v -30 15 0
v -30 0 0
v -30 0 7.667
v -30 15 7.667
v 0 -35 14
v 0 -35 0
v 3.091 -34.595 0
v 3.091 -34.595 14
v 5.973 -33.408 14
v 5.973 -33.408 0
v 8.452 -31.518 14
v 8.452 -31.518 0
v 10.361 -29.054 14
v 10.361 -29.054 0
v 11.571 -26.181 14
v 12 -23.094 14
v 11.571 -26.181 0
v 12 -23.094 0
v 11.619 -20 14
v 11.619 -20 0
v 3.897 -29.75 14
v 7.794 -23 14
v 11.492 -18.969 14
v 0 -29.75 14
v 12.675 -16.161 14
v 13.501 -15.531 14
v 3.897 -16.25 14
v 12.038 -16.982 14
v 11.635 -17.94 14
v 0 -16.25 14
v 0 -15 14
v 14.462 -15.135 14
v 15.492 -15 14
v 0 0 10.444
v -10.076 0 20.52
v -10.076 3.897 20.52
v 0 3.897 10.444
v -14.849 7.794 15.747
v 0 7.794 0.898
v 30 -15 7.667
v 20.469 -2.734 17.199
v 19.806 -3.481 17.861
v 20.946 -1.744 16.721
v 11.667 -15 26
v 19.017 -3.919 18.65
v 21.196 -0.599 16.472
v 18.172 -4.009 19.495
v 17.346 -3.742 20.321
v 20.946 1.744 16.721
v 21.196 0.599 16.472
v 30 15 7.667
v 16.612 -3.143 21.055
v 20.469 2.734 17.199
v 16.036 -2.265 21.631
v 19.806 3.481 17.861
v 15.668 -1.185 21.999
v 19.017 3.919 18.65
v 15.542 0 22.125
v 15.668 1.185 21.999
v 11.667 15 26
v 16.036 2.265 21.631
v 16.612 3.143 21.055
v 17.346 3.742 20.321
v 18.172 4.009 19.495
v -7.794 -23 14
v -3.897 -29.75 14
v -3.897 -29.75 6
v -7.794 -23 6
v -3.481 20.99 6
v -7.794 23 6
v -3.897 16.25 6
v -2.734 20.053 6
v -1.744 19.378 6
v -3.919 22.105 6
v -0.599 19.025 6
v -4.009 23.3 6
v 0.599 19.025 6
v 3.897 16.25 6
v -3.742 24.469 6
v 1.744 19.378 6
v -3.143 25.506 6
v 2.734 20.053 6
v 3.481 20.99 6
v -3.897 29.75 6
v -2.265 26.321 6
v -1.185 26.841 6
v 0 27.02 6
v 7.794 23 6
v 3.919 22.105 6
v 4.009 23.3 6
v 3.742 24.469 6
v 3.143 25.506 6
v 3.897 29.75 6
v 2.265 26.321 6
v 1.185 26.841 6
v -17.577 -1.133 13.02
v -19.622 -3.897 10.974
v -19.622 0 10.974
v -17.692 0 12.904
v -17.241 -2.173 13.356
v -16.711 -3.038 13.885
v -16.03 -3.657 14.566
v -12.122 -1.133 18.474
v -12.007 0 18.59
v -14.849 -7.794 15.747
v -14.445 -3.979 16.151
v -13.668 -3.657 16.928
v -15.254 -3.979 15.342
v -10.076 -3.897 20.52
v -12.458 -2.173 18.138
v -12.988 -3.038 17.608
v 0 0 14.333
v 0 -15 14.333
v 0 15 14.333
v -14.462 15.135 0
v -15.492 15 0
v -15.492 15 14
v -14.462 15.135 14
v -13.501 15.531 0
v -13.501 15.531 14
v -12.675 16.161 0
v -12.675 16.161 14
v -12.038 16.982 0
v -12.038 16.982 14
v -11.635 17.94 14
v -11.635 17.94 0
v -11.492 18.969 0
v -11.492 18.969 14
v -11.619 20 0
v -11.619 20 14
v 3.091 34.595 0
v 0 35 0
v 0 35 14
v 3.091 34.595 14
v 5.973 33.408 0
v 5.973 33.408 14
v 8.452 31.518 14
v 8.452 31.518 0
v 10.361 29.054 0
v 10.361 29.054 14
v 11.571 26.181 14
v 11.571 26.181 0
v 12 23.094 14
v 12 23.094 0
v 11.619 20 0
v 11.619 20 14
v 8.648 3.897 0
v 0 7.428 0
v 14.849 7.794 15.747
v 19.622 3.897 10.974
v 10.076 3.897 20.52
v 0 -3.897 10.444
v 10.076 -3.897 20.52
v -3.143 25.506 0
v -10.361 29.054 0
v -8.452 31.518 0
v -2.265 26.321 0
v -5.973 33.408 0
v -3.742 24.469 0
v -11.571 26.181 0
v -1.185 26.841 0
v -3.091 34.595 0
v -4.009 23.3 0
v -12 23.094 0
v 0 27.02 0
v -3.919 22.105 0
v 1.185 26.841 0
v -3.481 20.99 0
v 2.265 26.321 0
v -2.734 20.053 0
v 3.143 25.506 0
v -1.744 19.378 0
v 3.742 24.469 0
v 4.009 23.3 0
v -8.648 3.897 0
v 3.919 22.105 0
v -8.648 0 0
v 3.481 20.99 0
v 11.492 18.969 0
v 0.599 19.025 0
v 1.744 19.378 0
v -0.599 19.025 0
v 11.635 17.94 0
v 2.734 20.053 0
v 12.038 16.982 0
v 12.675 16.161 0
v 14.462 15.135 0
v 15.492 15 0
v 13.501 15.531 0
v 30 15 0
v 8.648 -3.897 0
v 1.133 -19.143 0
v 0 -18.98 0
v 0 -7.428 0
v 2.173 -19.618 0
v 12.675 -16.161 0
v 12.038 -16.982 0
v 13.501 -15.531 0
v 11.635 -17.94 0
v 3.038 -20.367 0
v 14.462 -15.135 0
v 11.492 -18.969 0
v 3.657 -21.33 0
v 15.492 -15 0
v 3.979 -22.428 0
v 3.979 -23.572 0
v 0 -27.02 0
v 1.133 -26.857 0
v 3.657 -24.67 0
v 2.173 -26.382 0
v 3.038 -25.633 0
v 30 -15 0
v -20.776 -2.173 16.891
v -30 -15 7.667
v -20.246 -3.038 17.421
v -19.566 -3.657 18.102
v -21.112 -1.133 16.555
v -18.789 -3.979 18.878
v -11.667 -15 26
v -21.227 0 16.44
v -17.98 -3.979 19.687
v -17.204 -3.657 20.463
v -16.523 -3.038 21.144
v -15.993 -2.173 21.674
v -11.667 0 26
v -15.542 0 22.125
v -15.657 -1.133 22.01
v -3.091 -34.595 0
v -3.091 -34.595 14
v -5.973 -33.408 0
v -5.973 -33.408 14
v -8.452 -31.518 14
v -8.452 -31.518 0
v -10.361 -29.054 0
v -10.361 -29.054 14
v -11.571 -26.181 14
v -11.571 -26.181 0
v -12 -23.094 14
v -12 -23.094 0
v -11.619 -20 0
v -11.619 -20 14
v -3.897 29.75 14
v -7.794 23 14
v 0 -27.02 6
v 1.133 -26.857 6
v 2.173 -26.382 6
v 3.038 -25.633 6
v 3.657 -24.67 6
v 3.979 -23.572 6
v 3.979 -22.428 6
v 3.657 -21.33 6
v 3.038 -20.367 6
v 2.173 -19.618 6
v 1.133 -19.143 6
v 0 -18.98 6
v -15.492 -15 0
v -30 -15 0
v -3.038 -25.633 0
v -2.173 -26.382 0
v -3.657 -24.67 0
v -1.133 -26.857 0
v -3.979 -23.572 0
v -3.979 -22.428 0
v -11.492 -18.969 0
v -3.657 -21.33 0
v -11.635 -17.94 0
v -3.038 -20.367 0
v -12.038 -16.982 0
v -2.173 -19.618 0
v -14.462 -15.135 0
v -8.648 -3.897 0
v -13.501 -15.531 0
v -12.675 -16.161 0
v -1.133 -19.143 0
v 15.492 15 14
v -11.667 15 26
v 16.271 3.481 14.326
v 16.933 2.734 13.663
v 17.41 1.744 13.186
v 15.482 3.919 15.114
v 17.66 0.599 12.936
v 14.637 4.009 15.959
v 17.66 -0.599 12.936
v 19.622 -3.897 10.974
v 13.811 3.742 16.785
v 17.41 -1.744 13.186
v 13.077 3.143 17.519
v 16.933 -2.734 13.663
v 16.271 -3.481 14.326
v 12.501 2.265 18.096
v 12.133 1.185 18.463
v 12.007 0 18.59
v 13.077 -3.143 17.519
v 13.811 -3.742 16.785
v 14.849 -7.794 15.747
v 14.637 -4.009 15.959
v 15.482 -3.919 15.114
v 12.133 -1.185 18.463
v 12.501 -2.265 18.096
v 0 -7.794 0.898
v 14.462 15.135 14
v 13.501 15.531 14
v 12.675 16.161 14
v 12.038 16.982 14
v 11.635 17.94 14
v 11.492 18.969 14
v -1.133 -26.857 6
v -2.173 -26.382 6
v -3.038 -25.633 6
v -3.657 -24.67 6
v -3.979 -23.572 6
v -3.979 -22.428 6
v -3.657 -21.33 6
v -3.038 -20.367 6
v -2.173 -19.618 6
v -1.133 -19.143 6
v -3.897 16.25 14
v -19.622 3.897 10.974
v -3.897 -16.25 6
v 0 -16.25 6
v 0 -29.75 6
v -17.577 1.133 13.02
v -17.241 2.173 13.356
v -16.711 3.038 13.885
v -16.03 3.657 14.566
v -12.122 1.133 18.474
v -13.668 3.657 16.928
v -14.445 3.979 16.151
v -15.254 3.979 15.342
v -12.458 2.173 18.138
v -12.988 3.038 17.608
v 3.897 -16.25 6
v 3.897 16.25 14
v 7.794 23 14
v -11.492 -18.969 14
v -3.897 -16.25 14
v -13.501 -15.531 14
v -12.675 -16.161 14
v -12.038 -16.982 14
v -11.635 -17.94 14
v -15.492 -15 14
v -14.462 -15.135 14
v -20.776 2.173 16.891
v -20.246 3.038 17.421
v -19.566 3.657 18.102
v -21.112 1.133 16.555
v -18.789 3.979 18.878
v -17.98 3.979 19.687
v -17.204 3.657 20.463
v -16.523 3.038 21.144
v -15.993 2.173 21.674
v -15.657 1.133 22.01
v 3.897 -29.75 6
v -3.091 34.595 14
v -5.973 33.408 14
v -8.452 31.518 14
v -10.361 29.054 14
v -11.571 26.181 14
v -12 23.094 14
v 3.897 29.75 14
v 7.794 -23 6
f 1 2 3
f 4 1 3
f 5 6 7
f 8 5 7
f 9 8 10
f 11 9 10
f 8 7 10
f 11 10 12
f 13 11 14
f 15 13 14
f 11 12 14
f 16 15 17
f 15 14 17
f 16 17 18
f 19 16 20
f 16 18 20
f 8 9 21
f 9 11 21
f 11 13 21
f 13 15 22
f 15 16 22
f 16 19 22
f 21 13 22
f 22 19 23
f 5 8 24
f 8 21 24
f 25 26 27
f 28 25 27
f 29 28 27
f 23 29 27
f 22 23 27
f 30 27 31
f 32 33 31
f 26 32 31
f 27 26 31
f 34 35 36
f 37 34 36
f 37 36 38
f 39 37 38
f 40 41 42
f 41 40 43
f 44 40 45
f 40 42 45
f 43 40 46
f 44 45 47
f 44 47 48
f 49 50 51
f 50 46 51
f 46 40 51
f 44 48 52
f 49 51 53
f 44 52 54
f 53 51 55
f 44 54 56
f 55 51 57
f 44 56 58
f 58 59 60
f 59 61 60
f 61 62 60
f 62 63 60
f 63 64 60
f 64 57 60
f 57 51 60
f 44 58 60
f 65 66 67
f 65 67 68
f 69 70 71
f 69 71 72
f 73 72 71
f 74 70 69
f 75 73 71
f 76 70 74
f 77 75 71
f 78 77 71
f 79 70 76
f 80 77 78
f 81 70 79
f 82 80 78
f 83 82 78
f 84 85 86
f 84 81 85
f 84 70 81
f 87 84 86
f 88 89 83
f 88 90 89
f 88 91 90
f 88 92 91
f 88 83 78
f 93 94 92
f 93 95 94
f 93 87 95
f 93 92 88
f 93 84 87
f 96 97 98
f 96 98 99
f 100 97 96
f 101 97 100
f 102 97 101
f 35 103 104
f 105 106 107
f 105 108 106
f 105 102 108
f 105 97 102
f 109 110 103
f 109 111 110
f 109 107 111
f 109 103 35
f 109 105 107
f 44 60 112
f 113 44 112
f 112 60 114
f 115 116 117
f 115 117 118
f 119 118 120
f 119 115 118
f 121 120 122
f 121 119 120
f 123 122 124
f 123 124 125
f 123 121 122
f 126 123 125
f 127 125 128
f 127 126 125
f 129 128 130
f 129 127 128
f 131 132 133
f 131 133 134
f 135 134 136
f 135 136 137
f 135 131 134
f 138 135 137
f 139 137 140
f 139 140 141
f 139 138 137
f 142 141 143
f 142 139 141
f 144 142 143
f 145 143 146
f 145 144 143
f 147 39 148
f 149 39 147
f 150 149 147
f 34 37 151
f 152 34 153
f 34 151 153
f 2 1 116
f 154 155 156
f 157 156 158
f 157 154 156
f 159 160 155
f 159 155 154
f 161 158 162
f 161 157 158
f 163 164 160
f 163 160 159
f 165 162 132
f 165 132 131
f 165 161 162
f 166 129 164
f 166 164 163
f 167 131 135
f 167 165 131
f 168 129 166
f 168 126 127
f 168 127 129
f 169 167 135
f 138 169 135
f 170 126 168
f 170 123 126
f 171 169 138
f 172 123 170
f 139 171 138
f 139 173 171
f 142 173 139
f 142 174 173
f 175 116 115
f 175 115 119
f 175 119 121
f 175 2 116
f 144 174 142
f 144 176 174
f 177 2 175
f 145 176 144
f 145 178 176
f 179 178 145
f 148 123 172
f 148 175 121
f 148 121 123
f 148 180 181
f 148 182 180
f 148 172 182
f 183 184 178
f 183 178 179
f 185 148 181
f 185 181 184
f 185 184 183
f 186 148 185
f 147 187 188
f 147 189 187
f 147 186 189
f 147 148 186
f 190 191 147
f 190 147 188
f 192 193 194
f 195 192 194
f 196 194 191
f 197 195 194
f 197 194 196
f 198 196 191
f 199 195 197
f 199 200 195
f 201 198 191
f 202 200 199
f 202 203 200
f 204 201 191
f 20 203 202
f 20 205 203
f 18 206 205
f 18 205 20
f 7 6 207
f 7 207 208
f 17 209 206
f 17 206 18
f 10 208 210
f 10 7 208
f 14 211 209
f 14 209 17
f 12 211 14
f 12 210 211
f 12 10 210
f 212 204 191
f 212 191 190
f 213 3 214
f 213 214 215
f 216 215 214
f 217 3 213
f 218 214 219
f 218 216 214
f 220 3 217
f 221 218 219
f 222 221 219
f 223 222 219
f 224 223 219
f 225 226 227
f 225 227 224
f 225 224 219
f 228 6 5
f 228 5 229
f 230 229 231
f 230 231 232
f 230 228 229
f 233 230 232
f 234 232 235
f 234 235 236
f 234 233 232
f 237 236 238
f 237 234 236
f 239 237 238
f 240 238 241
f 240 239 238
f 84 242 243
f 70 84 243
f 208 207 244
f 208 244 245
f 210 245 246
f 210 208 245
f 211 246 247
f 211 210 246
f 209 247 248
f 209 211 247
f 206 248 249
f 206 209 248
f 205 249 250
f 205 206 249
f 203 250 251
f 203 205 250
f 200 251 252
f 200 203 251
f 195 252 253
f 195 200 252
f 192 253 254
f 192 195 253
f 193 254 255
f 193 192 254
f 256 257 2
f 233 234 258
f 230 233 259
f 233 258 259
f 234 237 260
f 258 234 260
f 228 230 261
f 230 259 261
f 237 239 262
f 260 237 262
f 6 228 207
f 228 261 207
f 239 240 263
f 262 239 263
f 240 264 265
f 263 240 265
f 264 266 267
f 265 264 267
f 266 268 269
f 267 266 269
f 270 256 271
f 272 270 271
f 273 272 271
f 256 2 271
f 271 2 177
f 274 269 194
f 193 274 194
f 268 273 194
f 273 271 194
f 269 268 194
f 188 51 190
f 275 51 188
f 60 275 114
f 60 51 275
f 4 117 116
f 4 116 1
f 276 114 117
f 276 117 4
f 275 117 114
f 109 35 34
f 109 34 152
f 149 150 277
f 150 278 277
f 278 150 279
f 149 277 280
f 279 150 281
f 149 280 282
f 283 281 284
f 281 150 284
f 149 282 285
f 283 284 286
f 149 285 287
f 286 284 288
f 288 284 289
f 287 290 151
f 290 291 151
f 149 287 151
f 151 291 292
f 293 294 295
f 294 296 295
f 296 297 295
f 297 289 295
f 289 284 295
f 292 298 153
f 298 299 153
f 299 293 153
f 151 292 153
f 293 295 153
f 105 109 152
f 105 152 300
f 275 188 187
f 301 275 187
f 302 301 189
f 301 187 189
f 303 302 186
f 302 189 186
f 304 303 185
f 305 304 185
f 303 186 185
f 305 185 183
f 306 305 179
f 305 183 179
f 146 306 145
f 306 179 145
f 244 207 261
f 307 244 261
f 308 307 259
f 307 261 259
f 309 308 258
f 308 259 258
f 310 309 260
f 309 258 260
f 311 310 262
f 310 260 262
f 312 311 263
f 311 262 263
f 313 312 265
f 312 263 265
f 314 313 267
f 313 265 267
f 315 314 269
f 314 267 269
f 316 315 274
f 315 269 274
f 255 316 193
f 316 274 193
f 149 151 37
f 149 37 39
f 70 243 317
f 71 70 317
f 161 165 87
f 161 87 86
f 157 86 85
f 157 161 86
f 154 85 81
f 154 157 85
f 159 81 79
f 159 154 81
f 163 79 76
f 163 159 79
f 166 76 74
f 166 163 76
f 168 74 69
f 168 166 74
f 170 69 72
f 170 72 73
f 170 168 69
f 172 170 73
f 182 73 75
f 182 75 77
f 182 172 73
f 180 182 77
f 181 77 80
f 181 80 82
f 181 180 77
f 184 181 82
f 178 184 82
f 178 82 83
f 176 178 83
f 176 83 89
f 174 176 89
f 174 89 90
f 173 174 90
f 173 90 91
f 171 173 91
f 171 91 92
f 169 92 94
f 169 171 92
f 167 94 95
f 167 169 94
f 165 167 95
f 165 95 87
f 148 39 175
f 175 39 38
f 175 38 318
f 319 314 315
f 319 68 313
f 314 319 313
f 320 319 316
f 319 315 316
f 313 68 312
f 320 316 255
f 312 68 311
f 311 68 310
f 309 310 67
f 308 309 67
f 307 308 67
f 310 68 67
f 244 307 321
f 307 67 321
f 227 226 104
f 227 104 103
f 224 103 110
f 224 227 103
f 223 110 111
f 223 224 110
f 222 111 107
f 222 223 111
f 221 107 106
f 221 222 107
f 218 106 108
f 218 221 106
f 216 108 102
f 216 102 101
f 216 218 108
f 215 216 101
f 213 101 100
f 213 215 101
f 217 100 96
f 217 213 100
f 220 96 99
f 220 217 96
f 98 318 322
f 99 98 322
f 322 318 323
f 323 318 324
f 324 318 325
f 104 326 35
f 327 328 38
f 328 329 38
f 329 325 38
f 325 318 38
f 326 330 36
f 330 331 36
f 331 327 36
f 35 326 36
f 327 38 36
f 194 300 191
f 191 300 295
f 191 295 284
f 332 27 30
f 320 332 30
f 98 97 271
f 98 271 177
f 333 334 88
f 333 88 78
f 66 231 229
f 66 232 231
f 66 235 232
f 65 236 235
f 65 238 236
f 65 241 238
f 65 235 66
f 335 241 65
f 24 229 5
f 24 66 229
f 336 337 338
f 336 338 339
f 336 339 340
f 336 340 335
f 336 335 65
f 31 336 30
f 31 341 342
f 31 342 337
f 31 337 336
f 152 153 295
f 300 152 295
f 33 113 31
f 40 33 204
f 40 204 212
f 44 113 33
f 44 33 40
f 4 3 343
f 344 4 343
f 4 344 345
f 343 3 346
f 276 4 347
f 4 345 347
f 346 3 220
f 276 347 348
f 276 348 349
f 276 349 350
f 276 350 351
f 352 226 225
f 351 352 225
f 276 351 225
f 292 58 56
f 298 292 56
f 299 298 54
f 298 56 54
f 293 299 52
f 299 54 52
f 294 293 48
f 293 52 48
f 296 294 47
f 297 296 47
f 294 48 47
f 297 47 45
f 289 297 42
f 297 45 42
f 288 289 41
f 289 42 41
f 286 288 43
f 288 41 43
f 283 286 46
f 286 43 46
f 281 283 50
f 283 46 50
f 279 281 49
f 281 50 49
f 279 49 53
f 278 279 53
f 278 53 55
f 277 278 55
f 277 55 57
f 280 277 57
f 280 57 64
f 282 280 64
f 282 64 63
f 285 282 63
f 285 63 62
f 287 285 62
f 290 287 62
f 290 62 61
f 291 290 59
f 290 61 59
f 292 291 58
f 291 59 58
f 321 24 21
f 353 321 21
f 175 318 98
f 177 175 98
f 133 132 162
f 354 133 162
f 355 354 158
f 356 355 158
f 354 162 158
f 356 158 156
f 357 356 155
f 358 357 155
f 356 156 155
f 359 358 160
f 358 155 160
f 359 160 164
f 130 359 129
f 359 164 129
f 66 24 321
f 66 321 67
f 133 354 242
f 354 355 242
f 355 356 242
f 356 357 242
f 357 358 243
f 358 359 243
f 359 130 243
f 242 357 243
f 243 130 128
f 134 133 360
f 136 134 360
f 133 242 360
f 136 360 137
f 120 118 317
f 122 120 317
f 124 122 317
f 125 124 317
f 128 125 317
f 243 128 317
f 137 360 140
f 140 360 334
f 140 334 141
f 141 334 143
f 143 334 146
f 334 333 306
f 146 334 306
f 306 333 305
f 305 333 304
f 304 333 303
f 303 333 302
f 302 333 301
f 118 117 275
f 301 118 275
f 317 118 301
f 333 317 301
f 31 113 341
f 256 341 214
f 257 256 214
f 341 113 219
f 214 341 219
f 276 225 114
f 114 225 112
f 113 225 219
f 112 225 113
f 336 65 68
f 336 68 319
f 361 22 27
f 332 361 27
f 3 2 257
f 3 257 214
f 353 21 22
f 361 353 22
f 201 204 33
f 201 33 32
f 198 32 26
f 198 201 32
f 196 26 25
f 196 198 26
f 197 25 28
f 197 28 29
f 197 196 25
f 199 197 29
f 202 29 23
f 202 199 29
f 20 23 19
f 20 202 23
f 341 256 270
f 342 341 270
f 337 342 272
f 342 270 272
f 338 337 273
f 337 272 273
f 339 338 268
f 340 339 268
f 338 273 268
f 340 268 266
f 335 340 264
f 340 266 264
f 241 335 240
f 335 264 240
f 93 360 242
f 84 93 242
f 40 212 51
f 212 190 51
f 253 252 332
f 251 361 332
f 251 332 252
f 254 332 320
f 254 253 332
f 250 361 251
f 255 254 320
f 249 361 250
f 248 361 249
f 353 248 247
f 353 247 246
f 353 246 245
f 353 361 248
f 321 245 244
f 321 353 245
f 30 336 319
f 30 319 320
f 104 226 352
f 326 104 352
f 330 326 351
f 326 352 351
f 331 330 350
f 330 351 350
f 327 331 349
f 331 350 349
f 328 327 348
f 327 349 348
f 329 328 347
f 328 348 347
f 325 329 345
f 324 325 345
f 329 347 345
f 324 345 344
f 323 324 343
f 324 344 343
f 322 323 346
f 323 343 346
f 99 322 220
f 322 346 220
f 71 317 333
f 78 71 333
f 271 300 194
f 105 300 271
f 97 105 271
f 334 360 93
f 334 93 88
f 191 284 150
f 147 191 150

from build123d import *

# Parameters (mm, degrees)
PAD_DEPTH       = 15
PAD001_DEPTH    = 14
SKETCH002_R     = 4.02
HOLE_DEPTH      = 26.635776
POCKET_DEPTH    = 21.635776
POCKET001_DEPTH = 8


with BuildPart() as body:
    # Sketch → Pad (new body)
    with BuildSketch(Plane.XZ):
        Polygon((30, 7.667262), (11.667262, 26), (0, 14.332738), (0, 0), (30, 0), align=None)
    extrude(amount=PAD_DEPTH)

    # Sketch001 → Pad001 (join)
    with BuildSketch(Plane.XY):
        with BuildLine():
            ThreePointArc((0, -27.02), (4.02, -23), (0, -18.98))
            Line((0, -18.98), (0, -15))
            Line((0, -15), (15.491933, -15))
            ThreePointArc((15.491933, -15), (12.329656, -16.55051), (11.61895, -20))
            ThreePointArc((0, -35), (9.486833, -30.348469), (11.61895, -20))
            Line((0, -35), (0, -27.02))
        make_face()
    extrude(amount=PAD001_DEPTH)

    # Sketch002 (on DatumPlane) → Hole (cut, through all)
    with BuildSketch(Plane(origin=(18.833631, 0, 18.833631), x_dir=(-0.707107, 0, 0.707107), z_dir=(0.707107, 0, 0.707107))):
        with Locations((0.634776, 0)):
            Circle(SKETCH002_R)
    extrude(amount=-HOLE_DEPTH, mode=Mode.SUBTRACT)

    # Sketch003 (on DatumPlane) → Pocket (cut, through all)
    with BuildSketch(Plane(origin=(15.298097, 0, 15.298097), x_dir=(-0.707107, 0, 0.707107), z_dir=(0.707107, 0, 0.707107))):
        Polygon((7.384776, 3.897114), (0.634776, 7.794229), (-6.115224, 3.897114), (-6.115224, -3.897114), (0.634776, -7.794229), (7.384776, -3.897114), align=None)
    extrude(amount=-POCKET_DEPTH, mode=Mode.SUBTRACT)

    # Sketch004 (on Face13 of Pocket) → Pocket001 (cut)
    with BuildSketch(Plane(origin=(0, 0, 14), x_dir=(-1, 0, 0), z_dir=(0, 0, 1))):
        Polygon((3.897114, 29.75), (-3.897114, 29.75), (-7.794229, 23), (-3.897114, 16.25), (3.897114, 16.25), (7.794229, 23), align=None)
    extrude(amount=-POCKET001_DEPTH, mode=Mode.SUBTRACT)


with BuildPart() as part_mirroring:
    # Part__Mirroring: instance of Body
    add(body.part.mirror(Plane(origin=(0, 0, 0), x_dir=(0, -1, 0), z_dir=(1, 0, 0))))


with BuildPart() as part_mirroring002:
    # Part__Mirroring002: instance of Part__Mirroring
    add(part_mirroring.part.mirror(Plane(origin=(0, 0, 0), x_dir=(1, 0, 0), z_dir=(0, 1, 0))))


with BuildPart() as fusion:
    # Part__Mirroring001: instance of Body
    add(body.part.mirror(Plane(origin=(0, 0, 0), x_dir=(1, 0, 0), z_dir=(0, 1, 0))))

    # Fusion: union Body, Part__Mirroring002, Part__Mirroring
    add(body.part)
    add(part_mirroring002.part)
    add(part_mirroring.part)


solid = fusion.part
